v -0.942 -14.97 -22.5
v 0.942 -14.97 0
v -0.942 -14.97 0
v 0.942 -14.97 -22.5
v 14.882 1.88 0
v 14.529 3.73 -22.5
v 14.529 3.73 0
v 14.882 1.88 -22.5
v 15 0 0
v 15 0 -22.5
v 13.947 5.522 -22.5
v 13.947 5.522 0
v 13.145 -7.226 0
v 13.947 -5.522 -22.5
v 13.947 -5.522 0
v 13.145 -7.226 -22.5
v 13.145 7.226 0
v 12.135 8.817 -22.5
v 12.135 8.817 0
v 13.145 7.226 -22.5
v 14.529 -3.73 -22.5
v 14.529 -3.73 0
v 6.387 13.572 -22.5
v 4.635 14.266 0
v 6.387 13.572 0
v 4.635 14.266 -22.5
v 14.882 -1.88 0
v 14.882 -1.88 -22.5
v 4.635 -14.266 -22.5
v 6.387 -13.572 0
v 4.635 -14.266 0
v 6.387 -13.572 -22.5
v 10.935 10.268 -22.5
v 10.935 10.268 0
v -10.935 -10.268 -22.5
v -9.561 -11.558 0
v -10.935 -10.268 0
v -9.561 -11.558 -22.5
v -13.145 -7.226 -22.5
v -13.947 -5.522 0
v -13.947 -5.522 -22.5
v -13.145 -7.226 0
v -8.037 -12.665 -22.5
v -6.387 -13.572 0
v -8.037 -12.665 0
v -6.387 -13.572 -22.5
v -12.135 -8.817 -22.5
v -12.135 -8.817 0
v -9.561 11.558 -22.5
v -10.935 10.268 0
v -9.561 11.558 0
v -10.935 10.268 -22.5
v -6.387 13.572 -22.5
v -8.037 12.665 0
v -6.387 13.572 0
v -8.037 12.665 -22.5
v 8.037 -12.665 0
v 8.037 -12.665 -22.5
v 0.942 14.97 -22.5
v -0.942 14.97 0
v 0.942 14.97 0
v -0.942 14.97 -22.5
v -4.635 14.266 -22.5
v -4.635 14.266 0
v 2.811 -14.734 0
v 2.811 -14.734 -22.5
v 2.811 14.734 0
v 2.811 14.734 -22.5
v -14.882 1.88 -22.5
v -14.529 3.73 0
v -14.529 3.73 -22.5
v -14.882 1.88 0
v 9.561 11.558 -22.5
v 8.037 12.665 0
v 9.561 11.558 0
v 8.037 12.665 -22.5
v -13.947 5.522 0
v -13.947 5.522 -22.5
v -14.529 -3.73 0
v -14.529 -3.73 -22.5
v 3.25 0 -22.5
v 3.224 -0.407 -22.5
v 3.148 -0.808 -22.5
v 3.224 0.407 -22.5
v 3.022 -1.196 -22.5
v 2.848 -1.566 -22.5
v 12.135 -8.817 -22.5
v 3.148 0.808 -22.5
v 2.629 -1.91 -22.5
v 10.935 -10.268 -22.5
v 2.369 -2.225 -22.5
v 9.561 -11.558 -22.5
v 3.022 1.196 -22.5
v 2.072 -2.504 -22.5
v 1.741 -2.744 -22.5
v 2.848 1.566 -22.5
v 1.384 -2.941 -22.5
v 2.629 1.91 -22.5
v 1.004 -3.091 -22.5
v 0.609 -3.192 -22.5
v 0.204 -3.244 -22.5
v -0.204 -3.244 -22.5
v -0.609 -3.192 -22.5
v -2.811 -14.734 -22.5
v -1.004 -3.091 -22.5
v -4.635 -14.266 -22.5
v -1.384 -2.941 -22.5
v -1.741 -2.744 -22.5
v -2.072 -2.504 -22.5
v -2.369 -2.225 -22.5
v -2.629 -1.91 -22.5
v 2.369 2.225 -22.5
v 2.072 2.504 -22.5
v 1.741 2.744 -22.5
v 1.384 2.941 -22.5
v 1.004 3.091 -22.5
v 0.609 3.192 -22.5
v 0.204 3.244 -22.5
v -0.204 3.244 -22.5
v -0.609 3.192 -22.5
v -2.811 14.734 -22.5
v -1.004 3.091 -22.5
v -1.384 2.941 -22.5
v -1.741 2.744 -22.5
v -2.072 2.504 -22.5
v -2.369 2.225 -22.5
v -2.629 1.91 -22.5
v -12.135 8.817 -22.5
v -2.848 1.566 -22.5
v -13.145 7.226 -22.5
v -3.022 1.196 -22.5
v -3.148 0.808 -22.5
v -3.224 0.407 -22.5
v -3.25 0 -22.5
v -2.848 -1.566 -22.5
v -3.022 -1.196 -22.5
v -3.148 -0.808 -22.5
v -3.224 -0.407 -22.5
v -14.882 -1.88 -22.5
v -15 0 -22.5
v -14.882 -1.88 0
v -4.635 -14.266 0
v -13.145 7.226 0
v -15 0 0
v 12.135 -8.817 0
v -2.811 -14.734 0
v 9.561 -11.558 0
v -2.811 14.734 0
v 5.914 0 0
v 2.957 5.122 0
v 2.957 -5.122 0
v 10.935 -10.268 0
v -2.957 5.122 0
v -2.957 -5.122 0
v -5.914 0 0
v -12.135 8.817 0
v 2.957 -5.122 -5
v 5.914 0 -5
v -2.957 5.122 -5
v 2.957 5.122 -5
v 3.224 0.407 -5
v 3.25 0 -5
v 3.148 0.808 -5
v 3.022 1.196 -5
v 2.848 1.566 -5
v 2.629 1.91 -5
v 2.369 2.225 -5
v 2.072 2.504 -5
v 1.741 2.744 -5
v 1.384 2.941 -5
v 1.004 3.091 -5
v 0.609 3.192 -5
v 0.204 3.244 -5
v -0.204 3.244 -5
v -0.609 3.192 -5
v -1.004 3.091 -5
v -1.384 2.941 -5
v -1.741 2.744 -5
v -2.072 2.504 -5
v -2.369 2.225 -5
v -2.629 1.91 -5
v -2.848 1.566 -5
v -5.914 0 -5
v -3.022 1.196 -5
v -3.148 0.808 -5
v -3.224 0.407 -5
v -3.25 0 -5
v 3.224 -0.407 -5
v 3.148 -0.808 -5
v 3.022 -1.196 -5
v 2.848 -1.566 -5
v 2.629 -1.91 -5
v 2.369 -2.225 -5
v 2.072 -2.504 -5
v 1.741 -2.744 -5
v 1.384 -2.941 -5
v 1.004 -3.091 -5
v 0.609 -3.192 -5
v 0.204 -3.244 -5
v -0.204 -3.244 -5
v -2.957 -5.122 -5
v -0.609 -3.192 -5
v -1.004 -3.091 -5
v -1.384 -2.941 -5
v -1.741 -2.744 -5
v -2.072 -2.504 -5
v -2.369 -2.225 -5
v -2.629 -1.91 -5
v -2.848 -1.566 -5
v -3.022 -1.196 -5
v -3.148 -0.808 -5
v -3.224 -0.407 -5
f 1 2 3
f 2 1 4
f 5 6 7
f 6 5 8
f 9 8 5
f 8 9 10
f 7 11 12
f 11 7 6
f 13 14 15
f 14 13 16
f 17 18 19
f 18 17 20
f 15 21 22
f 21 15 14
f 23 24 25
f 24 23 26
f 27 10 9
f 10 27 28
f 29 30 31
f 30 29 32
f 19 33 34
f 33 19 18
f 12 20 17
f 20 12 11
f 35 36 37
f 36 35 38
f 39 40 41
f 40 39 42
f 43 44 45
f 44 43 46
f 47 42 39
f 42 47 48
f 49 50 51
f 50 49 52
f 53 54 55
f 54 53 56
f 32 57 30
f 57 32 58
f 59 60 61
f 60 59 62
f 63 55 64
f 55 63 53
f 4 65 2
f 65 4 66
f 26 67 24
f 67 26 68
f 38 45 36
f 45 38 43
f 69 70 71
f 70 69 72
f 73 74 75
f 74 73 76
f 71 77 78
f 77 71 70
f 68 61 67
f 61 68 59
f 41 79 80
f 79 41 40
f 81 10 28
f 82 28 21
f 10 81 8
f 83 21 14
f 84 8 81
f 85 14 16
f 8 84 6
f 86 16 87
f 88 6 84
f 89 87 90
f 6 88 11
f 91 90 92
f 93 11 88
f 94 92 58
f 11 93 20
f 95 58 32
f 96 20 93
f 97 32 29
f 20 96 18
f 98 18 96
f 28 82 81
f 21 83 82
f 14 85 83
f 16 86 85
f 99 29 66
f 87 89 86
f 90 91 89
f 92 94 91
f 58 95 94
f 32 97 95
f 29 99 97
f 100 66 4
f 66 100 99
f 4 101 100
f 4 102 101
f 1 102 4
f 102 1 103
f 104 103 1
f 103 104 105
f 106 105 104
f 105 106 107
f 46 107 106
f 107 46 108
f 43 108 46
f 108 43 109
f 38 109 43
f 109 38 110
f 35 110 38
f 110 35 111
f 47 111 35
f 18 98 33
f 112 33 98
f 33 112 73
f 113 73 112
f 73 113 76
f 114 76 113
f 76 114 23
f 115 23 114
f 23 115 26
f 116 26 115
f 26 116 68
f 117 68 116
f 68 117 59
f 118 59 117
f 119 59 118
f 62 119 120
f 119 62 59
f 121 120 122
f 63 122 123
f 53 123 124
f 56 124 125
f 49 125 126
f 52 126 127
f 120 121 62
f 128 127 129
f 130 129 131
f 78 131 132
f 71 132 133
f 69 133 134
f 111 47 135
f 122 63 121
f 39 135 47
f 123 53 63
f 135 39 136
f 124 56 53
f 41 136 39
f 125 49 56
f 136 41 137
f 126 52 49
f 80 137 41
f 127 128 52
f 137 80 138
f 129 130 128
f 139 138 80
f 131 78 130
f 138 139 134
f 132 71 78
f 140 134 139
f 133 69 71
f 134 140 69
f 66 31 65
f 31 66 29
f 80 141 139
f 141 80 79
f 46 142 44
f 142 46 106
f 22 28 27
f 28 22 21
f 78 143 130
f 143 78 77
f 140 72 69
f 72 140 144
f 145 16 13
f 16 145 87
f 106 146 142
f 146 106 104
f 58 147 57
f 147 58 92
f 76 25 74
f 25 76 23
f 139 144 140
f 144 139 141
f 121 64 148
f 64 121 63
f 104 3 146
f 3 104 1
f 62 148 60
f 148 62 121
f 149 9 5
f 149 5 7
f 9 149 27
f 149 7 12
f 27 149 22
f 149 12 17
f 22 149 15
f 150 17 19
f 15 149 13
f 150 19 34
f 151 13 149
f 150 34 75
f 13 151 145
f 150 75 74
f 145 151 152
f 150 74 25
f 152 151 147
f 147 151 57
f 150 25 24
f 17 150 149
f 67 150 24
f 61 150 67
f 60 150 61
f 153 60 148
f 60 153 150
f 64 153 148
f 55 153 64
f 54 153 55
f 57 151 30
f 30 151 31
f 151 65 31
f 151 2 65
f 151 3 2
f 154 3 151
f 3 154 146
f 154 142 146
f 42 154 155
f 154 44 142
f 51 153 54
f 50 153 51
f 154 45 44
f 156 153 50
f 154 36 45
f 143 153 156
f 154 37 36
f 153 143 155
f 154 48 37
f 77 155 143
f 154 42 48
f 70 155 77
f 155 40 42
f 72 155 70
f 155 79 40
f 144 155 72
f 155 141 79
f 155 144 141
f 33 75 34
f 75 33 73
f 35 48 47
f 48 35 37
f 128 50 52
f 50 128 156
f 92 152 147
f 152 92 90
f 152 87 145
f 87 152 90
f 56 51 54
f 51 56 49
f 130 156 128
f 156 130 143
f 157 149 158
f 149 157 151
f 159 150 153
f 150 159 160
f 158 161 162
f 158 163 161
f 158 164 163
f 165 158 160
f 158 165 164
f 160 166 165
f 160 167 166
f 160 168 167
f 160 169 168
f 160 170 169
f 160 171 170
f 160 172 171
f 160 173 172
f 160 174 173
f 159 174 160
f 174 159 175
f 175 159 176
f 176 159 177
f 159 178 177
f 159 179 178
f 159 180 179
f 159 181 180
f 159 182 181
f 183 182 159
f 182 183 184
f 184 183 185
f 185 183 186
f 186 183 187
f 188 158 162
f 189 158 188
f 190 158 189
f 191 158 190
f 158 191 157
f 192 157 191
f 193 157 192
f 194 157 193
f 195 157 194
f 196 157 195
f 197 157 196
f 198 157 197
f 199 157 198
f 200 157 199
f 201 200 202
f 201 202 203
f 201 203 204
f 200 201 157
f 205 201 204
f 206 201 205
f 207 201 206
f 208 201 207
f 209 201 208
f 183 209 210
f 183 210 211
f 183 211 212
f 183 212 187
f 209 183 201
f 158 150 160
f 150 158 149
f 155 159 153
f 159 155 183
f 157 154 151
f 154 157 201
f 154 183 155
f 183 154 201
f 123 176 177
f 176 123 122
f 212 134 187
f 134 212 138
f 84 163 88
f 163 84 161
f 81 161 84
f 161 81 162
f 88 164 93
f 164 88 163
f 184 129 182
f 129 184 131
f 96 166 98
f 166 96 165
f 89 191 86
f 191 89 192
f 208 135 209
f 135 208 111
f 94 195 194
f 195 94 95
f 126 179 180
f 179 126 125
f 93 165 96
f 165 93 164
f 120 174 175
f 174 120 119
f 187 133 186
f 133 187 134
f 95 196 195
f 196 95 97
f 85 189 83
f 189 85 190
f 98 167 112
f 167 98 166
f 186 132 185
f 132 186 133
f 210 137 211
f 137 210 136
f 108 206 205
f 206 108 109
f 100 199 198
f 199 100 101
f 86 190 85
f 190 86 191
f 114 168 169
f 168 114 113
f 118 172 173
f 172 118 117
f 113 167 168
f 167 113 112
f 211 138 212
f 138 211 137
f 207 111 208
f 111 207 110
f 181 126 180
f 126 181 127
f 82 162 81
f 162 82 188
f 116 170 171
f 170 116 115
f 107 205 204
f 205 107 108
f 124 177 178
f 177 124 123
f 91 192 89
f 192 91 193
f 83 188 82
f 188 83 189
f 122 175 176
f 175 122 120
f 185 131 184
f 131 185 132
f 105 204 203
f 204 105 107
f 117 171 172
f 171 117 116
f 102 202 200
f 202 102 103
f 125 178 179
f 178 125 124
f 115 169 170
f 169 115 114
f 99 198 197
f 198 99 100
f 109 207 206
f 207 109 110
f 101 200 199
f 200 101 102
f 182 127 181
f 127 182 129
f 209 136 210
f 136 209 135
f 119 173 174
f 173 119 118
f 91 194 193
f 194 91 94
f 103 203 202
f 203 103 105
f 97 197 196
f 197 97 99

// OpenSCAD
$fn = 50;

difference() {
	union() {
		translate(v = [0, 0, -22.5]) {
			cylinder(h = 22.5, r = 15.0);
		}
		#translate(v = [0, 0, -24.0]) {
			cylinder(h = 24, r = 2.875);
		}
	}
	union() {
		translate(v = [0, 0, 0]) {
			rotate(a = [0, 0, 0]) {
				difference() {
					union() {
						translate(v = [0, 0, -5]) {
							linear_extrude(height = 5) {
								polygon(points = [[5.914249999999999, 0.0], [2.957125, 5.1218907443321156], [-2.9571249999999982, 5.1218907443321156], [-5.914249999999999, 7.242867331857232e-16], [-2.9571250000000022, -5.121890744332115], [2.9571249999999956, -5.121890744332118]]);
							}
						}
					}
					union();
				}
			}
		}
		#translate(v = [0, 0, -100.0]) {
			cylinder(h = 200, r = 3.25);
		}
	}
}
